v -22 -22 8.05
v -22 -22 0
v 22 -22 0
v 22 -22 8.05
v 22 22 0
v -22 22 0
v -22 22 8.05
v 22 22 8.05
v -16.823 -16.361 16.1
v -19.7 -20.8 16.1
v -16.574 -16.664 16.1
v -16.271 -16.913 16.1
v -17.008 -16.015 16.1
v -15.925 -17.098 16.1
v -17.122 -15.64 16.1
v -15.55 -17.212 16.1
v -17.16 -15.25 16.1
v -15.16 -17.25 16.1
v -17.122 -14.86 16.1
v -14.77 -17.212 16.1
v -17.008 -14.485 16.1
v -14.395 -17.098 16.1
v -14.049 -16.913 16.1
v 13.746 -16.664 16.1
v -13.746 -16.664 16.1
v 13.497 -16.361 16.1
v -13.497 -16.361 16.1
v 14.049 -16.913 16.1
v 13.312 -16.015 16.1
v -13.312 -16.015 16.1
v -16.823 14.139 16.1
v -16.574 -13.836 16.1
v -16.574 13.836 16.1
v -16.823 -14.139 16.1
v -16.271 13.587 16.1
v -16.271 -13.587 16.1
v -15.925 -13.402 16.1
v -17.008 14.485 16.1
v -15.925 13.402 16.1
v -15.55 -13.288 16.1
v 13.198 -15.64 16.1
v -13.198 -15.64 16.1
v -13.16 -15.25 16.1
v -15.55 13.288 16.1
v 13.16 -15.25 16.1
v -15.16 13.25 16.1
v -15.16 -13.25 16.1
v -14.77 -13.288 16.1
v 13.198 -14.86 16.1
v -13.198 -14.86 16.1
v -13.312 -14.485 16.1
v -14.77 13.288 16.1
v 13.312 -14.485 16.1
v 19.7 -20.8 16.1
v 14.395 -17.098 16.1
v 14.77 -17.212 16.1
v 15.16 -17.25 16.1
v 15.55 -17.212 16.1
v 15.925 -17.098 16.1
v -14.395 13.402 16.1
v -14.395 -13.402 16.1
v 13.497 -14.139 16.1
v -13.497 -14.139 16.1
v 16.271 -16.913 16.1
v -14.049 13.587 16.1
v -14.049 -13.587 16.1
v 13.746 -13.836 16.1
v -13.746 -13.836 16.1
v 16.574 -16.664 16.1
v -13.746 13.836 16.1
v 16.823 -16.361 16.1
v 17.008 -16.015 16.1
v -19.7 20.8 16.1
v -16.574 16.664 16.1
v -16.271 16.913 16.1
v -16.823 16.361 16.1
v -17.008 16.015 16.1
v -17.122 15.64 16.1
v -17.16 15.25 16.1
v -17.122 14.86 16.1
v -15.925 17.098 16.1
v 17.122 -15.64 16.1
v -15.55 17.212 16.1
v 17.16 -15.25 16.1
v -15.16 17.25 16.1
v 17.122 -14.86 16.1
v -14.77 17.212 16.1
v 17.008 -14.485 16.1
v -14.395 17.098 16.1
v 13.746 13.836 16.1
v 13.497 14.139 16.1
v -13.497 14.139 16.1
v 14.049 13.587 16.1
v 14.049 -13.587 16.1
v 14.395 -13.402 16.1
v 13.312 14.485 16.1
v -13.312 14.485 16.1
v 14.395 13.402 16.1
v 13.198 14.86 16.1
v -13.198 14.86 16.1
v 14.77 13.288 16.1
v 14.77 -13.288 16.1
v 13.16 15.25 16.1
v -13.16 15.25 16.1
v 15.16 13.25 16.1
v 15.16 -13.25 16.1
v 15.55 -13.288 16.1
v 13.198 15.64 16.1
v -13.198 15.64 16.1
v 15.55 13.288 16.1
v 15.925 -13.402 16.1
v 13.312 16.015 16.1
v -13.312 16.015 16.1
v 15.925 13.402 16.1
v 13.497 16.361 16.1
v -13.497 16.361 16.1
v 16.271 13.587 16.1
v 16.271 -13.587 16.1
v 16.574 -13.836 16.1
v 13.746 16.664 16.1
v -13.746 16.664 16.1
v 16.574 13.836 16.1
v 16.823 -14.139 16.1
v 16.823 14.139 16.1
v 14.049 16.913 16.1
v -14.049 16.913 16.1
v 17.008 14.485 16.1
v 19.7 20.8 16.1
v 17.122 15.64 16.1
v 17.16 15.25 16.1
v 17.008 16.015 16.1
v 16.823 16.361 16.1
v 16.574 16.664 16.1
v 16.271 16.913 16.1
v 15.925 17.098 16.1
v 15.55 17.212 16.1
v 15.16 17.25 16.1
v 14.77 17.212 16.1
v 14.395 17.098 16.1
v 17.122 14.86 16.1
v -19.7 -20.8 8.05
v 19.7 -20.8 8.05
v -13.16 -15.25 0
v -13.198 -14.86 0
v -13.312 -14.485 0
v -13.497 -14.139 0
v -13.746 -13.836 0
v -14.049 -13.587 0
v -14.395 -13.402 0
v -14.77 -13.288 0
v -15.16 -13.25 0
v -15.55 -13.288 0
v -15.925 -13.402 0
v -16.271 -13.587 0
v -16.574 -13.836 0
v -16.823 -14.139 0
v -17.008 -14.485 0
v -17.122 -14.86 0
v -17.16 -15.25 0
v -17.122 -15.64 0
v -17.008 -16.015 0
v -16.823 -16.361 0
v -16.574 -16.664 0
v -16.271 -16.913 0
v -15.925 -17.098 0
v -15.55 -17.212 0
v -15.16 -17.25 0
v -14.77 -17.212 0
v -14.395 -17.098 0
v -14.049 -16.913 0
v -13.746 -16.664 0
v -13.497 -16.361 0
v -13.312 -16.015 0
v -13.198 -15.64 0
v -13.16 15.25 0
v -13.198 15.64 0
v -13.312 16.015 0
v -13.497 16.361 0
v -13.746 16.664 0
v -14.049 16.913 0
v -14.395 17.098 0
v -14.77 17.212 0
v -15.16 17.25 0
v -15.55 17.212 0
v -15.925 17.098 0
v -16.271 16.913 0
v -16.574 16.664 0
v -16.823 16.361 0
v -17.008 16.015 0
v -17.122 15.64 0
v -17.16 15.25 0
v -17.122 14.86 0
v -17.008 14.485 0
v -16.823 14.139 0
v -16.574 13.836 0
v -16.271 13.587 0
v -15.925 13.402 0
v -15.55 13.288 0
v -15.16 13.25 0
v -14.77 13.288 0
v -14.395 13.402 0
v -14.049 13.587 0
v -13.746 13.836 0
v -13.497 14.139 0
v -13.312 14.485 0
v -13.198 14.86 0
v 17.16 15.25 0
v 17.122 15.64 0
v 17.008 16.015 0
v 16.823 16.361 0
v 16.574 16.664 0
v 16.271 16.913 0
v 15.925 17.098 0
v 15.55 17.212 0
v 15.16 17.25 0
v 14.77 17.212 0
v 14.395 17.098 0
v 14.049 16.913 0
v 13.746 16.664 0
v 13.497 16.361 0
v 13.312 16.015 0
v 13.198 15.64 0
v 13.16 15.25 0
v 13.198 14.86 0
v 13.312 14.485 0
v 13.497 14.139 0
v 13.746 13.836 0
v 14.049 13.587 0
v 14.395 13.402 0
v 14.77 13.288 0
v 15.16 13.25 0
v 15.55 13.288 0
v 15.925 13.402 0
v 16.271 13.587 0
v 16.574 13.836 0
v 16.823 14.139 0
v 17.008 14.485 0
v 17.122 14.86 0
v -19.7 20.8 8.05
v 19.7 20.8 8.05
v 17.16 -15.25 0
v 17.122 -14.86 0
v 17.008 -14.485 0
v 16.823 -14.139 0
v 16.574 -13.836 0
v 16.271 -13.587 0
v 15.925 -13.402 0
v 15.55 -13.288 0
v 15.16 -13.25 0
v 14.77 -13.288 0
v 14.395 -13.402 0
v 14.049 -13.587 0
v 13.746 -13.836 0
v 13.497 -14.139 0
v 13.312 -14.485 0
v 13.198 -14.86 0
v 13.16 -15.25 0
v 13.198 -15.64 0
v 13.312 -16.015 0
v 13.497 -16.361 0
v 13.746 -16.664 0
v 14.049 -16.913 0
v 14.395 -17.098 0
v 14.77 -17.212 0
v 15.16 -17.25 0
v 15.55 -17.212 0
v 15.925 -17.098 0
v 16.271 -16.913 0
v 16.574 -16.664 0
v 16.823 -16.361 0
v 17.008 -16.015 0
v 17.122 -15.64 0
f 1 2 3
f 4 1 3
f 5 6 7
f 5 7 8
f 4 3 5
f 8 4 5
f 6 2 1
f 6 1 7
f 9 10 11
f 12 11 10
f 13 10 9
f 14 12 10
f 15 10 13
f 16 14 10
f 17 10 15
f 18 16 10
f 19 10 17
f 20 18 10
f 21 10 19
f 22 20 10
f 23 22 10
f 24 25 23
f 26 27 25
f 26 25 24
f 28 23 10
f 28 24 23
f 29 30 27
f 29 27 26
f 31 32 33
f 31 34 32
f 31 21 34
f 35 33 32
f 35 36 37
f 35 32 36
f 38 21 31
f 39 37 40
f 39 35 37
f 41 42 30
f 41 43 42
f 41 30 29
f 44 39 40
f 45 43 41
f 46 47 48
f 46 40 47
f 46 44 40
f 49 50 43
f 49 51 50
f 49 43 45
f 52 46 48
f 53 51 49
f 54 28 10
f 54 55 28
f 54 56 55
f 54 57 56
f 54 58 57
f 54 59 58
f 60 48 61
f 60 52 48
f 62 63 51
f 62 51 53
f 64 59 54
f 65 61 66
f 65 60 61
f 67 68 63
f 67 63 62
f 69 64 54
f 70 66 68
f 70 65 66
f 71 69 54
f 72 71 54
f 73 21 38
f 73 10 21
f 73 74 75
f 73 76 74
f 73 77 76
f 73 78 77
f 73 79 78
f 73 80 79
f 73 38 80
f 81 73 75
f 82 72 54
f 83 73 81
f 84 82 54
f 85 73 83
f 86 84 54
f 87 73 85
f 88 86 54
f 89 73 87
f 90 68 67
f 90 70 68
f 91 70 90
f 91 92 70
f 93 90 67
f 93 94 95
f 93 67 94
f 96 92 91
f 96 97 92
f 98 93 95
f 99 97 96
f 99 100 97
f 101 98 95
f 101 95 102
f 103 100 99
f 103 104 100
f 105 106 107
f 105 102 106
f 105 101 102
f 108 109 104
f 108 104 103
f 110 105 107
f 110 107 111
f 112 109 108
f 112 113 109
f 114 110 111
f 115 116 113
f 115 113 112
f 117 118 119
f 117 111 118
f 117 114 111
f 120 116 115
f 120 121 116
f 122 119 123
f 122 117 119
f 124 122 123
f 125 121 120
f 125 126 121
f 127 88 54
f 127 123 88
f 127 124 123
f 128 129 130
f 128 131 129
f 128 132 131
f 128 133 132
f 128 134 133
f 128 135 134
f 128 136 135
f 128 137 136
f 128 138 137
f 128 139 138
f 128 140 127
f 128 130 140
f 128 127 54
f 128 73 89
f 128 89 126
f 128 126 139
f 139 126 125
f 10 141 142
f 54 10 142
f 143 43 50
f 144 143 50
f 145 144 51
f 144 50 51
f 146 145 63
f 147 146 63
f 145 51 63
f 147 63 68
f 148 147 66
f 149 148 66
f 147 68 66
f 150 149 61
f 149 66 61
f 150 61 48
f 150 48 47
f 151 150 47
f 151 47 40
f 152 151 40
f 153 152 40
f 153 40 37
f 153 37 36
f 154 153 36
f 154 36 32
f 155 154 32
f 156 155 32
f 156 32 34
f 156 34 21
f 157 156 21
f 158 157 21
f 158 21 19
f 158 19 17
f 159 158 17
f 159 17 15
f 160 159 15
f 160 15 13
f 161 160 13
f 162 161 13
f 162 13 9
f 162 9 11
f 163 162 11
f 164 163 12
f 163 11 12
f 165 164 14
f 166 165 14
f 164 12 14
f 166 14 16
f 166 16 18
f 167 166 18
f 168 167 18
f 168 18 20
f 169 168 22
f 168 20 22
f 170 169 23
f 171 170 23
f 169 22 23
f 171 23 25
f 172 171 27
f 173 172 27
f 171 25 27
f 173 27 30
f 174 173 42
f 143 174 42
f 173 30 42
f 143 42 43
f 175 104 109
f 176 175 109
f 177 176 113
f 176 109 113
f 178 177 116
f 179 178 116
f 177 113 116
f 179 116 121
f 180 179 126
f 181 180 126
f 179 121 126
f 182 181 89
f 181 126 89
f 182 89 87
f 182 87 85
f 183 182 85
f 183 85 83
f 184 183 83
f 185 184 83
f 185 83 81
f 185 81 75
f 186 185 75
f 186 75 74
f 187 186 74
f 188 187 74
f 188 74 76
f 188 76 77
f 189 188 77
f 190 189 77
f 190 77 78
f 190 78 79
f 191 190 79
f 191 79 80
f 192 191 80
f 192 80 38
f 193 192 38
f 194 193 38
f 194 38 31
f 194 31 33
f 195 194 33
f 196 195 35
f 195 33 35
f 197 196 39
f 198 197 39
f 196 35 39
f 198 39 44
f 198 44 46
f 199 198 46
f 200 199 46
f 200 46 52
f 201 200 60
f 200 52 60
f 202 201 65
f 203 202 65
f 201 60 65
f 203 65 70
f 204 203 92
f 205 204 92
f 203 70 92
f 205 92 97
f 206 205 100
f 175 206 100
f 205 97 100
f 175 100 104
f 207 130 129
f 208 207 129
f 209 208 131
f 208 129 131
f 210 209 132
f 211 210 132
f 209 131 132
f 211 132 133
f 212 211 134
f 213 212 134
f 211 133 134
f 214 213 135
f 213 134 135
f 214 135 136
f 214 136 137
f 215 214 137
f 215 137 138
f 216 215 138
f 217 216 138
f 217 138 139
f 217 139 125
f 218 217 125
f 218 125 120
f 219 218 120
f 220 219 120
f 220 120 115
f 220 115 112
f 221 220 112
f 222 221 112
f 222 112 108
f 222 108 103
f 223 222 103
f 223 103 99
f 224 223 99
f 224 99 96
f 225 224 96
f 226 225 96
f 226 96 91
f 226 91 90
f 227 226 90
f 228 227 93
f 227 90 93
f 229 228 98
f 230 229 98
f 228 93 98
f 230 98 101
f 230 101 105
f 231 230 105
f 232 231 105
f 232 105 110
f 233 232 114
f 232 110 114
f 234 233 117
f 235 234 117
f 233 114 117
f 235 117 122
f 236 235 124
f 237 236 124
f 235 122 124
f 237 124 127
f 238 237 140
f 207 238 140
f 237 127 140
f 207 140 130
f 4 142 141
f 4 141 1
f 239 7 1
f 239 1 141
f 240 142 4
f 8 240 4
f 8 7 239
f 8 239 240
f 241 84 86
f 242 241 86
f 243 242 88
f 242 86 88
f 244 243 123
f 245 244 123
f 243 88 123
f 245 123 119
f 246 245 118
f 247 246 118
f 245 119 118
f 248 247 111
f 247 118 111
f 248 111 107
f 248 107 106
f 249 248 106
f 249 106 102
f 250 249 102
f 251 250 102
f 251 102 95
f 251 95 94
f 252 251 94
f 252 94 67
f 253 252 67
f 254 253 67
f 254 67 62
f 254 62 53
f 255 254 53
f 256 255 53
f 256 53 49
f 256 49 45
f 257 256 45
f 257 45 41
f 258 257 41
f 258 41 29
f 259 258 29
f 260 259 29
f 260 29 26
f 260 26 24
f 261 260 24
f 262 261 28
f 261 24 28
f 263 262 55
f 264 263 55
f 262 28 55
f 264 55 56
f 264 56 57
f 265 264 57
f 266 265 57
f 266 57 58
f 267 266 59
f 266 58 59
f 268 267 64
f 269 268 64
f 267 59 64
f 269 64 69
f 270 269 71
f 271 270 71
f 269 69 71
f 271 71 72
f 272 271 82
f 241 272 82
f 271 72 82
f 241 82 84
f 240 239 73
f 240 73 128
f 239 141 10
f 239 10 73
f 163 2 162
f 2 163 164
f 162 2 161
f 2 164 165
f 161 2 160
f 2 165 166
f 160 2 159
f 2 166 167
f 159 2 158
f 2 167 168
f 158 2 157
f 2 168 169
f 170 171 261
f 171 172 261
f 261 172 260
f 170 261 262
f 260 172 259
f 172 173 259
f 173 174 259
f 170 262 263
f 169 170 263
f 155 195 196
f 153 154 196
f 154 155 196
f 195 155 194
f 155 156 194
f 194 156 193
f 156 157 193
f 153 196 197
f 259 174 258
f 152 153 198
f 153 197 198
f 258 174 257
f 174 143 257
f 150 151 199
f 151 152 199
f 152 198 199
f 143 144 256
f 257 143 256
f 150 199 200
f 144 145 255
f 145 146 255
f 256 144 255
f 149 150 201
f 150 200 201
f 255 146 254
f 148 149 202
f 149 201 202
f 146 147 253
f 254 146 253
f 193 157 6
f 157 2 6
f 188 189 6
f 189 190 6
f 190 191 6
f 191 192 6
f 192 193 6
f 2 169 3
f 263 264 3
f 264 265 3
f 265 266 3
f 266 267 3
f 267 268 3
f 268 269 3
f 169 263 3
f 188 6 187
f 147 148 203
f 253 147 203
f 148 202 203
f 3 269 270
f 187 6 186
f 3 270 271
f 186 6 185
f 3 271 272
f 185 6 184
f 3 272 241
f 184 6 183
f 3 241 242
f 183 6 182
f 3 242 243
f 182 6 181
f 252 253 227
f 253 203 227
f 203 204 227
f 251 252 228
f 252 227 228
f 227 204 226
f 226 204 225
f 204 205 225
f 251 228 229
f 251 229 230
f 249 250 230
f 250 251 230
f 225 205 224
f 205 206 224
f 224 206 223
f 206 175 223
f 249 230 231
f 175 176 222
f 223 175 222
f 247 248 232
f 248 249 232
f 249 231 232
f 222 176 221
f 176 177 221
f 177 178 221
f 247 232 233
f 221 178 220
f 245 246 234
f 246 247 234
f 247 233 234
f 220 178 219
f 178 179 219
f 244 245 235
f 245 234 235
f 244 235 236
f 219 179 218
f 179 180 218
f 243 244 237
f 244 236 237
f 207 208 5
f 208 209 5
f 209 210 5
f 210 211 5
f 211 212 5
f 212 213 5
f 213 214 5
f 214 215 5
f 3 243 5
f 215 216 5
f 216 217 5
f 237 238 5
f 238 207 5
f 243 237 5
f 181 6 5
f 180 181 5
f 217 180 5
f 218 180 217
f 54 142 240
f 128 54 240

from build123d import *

# Parameters (mm, degrees)
SKETCH1_W           = 44
SKETCH1_H           = 44
BOSS_EXTRUDE1_DEPTH = 8.05
SKETCH2_W           = 39.4
SKETCH2_H           = 41.6
BOSS_EXTRUDE2_DEPTH = 8.05
SKETCH3_R           = 2
CUT_EXTRUDE1_DEPTH  = 36.031557202


with BuildPart() as part:
    # Sketch1 → Boss-Extrude1 (new body)
    with BuildSketch(Plane.XY):
        Rectangle(SKETCH1_W, SKETCH1_H)
    extrude(amount=BOSS_EXTRUDE1_DEPTH)

    # Sketch2 → Boss-Extrude2 (add)
    with BuildSketch(Plane.XY.offset(8.05)):
        Rectangle(SKETCH2_W, SKETCH2_H)
    extrude(amount=BOSS_EXTRUDE2_DEPTH)

    # Sketch3 → Cut-Extrude1 (cut, through all)
    with BuildSketch(Plane.XY.offset(16.1)):
        with Locations((-15.16, 15.25)):
            Circle(SKETCH3_R)
        with Locations((15.16, 15.25)):
            Circle(SKETCH3_R)
        with Locations((15.16, -15.25)):
            Circle(SKETCH3_R)
        with Locations((-15.16, -15.25)):
            Circle(SKETCH3_R)
    extrude(amount=-CUT_EXTRUDE1_DEPTH, mode=Mode.SUBTRACT)


solid = part.part
